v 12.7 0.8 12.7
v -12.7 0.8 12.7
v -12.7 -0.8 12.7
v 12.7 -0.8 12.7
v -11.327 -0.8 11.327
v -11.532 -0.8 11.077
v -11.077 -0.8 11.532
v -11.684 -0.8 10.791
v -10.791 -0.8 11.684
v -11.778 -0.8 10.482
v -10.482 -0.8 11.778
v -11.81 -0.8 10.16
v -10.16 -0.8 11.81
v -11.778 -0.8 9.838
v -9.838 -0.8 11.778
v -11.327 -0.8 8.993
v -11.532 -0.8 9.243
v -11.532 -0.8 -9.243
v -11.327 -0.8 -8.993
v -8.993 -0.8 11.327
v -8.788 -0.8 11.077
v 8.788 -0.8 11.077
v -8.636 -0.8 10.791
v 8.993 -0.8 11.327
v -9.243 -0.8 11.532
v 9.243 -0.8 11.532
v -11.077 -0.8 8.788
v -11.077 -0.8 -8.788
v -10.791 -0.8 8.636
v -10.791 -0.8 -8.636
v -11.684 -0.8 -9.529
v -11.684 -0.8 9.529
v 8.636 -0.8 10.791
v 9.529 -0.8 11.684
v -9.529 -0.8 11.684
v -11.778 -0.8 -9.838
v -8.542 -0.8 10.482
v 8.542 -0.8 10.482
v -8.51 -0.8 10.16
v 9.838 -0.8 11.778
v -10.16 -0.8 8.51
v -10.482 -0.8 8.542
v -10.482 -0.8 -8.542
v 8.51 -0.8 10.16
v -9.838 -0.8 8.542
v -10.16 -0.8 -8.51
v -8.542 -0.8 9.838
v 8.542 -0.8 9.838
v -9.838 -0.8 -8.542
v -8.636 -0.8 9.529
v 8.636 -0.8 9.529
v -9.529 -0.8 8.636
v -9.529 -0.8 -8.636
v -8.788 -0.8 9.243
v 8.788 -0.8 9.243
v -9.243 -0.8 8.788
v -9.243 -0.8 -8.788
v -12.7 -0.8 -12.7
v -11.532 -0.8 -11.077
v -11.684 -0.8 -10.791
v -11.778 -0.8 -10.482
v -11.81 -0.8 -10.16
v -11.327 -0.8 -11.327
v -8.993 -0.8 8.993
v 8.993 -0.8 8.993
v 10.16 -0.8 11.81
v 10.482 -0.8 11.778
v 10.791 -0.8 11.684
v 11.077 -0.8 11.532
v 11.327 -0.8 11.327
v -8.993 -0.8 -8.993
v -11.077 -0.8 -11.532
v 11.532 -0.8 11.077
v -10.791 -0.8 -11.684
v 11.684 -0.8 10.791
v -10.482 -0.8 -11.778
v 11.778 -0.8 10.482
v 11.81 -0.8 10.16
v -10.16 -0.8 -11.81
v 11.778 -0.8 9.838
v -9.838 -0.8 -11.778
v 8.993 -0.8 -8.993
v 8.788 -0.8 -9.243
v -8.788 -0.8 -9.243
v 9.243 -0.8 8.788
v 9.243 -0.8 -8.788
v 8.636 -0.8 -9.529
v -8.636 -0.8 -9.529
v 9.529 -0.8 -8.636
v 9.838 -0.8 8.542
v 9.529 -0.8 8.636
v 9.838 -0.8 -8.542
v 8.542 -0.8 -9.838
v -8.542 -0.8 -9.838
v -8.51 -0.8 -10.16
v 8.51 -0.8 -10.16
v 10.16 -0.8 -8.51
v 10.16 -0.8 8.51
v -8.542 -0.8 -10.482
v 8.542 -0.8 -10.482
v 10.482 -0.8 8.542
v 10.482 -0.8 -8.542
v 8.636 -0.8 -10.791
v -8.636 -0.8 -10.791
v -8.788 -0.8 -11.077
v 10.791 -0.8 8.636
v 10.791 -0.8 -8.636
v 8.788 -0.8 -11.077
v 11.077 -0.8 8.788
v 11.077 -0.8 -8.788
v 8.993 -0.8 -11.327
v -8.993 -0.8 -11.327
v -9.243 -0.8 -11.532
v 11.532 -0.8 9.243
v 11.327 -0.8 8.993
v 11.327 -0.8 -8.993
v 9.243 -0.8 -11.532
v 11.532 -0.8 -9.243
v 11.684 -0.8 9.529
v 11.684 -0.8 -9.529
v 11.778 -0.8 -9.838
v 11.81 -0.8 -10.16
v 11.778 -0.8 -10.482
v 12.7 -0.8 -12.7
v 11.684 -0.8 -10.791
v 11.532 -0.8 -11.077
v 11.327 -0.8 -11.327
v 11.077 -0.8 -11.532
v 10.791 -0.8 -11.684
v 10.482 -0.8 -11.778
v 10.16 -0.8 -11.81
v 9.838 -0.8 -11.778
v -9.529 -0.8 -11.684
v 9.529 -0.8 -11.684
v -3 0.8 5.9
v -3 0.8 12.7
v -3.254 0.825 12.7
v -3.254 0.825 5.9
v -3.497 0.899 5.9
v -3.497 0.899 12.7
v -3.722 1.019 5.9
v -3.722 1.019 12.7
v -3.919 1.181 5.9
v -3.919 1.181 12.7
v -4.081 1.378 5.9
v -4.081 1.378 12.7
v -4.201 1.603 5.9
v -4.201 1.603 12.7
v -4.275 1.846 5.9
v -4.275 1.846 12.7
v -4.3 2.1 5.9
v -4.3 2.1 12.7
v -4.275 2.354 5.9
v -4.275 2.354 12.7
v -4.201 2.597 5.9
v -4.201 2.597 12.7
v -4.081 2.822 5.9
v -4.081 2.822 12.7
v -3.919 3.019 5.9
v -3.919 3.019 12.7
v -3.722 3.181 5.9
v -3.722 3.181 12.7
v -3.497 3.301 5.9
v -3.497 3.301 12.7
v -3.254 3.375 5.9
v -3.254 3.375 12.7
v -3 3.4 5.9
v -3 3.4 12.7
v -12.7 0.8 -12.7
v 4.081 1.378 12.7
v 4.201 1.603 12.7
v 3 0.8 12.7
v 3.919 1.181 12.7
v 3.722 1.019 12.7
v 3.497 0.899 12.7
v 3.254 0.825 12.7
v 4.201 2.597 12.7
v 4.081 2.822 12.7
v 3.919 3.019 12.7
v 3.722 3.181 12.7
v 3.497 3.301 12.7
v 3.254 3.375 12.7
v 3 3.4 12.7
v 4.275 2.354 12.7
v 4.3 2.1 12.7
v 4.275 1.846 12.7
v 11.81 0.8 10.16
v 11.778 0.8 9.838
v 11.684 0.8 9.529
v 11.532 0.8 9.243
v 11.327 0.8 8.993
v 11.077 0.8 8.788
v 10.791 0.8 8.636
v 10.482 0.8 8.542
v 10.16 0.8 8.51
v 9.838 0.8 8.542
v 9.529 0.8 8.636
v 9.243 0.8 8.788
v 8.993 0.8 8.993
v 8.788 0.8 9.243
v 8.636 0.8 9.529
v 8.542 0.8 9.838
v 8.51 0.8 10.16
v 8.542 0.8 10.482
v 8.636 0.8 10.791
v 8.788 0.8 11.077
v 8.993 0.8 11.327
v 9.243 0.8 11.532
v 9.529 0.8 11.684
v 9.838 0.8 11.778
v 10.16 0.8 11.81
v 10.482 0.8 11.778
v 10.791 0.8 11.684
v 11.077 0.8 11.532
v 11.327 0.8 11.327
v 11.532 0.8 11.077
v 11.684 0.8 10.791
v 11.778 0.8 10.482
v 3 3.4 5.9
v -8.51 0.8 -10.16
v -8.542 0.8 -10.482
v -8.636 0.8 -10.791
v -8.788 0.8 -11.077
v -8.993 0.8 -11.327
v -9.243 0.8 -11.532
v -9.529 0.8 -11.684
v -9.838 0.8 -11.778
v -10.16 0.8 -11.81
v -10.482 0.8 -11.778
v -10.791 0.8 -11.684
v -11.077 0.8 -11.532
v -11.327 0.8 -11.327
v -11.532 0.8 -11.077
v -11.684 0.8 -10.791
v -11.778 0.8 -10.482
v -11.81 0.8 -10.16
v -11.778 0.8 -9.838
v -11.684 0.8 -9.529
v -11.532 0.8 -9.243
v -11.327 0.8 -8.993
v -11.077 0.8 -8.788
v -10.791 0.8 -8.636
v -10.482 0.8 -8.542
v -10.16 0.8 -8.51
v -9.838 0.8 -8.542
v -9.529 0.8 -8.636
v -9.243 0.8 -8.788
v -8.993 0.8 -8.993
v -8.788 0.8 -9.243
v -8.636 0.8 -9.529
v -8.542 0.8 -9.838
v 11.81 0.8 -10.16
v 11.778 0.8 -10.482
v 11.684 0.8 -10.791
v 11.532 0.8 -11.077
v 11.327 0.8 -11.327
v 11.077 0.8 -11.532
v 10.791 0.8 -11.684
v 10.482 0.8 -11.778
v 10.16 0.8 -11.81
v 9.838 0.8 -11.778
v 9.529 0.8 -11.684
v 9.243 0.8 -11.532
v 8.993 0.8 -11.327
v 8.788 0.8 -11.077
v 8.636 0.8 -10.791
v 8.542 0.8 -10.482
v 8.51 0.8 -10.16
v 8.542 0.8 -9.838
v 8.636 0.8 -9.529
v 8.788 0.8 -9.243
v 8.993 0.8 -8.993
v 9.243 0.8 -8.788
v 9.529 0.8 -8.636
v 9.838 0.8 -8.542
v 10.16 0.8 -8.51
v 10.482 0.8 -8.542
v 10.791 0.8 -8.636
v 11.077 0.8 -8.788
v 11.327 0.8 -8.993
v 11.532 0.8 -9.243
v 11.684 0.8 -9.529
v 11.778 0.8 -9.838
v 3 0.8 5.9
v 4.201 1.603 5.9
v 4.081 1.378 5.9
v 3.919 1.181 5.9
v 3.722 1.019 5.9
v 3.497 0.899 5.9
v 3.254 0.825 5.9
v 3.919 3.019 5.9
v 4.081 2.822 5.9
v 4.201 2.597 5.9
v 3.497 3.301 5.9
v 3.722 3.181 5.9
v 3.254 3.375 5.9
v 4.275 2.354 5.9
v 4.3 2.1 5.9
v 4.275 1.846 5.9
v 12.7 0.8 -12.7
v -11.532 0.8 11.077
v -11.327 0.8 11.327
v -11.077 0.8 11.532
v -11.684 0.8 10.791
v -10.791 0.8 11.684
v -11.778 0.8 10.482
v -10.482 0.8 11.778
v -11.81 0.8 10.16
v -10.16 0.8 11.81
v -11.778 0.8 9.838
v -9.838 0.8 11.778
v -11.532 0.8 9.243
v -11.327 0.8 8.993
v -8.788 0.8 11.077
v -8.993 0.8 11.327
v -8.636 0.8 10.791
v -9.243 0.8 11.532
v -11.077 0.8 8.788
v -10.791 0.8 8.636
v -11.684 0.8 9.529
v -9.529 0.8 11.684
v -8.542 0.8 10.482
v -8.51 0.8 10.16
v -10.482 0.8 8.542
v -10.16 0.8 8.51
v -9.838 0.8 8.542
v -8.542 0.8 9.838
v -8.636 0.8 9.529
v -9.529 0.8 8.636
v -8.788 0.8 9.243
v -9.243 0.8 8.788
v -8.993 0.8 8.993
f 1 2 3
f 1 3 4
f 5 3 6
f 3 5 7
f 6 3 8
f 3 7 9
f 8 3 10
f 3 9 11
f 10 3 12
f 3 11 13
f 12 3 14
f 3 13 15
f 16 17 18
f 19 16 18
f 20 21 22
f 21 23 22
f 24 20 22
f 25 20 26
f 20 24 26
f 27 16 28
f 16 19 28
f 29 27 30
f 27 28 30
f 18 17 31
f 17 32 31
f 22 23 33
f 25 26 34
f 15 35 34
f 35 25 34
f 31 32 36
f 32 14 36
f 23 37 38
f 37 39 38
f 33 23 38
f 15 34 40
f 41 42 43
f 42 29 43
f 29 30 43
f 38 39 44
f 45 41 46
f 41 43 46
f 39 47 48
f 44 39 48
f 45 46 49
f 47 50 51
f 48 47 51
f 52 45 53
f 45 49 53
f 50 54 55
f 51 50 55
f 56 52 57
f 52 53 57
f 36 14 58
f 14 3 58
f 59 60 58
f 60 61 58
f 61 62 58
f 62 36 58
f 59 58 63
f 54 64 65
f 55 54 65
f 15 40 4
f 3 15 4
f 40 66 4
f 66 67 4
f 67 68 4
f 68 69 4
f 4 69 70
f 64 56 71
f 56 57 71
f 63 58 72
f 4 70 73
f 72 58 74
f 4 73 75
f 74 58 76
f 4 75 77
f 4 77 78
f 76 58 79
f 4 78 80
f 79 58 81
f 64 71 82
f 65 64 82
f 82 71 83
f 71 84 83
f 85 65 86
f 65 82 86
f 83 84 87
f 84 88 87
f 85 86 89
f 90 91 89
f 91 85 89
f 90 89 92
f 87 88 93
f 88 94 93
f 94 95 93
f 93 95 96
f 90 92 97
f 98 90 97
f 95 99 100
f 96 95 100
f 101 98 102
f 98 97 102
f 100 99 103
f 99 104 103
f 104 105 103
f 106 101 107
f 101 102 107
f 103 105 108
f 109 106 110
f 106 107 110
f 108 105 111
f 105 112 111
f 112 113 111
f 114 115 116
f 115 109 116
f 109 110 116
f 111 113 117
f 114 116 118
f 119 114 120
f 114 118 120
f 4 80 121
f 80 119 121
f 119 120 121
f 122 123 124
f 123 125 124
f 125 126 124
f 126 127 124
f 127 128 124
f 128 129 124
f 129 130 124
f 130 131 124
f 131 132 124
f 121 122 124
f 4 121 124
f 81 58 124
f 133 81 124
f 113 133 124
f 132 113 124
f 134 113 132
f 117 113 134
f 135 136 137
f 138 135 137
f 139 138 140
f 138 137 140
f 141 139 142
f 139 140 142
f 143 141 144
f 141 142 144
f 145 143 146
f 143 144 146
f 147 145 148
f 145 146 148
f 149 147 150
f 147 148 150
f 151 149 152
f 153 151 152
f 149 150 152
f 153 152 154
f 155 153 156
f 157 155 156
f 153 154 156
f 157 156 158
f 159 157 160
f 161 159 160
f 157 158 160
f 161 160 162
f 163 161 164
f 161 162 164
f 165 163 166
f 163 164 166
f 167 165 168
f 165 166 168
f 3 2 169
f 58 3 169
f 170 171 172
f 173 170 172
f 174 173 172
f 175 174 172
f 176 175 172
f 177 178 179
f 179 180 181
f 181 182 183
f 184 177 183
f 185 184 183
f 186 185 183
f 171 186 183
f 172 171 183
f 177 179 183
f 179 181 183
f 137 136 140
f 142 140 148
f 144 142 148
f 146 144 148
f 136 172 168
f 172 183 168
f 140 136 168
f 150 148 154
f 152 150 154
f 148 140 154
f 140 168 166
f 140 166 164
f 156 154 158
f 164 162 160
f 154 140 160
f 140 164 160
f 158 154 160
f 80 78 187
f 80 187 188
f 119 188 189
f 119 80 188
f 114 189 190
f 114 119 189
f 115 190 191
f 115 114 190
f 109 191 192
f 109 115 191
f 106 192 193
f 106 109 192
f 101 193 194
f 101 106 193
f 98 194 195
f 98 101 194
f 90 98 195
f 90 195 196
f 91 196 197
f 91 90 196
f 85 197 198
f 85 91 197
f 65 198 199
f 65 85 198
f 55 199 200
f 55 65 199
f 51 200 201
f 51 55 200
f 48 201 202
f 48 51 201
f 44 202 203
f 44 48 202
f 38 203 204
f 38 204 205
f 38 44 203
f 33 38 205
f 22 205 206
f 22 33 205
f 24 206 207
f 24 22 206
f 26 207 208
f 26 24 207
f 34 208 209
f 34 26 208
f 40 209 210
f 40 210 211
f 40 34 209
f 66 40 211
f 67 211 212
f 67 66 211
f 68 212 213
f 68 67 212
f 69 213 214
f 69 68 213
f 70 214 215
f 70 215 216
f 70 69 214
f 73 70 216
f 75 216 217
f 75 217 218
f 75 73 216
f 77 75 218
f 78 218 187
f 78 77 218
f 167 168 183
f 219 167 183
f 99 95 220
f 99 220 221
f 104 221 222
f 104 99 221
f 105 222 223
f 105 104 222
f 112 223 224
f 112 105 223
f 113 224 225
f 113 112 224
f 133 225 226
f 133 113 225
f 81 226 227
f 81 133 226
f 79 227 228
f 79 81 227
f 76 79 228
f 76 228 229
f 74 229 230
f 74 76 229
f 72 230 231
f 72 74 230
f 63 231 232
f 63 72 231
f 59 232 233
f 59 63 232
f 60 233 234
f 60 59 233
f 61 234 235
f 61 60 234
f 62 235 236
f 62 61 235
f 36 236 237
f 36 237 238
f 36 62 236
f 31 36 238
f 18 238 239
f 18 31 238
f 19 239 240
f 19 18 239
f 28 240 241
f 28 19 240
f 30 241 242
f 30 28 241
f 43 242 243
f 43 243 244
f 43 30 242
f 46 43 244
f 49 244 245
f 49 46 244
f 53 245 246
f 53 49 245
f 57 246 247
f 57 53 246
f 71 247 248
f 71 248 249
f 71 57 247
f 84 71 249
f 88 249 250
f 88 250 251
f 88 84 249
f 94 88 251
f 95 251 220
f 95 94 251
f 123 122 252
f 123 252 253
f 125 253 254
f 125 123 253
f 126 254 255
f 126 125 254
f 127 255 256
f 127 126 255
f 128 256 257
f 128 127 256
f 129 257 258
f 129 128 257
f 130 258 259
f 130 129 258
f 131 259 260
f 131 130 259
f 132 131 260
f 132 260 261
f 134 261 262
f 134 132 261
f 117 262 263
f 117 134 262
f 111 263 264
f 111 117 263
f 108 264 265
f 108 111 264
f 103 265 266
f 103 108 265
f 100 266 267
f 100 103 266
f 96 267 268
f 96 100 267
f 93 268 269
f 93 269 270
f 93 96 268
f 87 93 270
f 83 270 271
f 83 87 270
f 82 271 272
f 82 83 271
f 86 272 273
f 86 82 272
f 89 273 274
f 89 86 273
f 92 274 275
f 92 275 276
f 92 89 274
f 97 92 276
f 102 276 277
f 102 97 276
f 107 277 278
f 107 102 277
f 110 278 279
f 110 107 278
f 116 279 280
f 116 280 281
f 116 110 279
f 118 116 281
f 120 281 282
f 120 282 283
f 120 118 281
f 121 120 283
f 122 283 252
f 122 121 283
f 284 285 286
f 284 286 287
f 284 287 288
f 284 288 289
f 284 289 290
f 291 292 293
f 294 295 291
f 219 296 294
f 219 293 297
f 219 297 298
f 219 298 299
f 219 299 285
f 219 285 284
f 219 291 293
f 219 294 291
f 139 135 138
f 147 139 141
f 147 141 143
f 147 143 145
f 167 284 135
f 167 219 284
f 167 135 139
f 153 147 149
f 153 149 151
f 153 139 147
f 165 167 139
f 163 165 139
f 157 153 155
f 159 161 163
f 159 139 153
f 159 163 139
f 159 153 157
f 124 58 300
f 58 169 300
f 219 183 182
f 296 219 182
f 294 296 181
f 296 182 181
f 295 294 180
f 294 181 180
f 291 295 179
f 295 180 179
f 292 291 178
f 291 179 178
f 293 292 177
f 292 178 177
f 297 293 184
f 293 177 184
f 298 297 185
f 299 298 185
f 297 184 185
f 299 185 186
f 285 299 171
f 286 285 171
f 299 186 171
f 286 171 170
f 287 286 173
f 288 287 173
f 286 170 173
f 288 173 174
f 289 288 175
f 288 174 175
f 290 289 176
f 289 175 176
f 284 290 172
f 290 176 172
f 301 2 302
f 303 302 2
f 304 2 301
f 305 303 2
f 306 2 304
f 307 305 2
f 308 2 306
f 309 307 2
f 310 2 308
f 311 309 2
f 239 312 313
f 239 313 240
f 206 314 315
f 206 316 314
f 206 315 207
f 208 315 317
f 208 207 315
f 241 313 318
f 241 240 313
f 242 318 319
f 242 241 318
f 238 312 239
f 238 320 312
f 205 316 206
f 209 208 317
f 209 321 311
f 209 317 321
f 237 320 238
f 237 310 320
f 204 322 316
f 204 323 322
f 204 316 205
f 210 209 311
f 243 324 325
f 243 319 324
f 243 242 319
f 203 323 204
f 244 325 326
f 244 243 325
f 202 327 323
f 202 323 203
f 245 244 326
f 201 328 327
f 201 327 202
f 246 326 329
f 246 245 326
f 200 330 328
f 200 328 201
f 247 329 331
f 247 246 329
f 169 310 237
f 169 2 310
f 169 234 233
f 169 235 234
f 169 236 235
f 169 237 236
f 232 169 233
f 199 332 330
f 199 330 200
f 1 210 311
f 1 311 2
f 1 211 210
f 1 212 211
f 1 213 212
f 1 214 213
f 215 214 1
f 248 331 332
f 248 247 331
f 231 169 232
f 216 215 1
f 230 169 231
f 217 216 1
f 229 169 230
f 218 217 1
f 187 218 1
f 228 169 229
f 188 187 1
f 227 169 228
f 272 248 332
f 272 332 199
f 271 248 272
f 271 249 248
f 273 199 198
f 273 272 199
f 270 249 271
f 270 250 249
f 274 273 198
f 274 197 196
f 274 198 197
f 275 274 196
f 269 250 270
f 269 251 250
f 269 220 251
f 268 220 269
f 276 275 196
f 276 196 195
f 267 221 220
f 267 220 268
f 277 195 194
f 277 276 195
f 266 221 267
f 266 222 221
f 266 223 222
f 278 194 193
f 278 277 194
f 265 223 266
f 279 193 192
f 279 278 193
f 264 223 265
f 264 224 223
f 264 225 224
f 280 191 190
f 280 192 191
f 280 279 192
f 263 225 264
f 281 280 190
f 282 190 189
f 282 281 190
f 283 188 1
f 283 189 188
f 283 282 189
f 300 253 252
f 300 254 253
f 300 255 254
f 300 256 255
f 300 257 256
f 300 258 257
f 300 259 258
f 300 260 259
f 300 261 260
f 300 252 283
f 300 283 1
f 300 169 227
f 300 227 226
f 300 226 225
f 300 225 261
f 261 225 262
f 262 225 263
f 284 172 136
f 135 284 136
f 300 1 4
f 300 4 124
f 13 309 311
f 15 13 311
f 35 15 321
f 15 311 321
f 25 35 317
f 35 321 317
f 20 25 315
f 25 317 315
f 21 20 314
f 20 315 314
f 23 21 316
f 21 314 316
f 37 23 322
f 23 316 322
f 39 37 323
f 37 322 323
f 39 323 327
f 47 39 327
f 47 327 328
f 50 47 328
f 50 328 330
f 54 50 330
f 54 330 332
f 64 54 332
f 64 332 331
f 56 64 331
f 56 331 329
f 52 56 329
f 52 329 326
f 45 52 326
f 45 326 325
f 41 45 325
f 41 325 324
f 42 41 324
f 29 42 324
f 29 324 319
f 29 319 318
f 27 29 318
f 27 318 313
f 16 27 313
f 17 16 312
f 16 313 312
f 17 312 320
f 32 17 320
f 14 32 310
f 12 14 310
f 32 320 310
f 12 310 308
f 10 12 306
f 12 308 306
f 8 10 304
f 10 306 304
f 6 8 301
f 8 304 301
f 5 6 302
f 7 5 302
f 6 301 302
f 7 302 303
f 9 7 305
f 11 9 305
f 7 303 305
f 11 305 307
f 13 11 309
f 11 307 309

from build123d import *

# Parameters (mm, degrees)
SKETCH2_W             = 25.4
SKETCH2_H             = 25.4
BOSS_EXTRUDE1_DEPTH   = 0.8
CUT_EXTRUDE2_REACH    = 20.032
SKETCH5_R             = 1.65
CRVPATTERN1_START     = -0.8
CRVPATTERN1_OUTLINE_R = 1.65
CRVPATTERN1_DEPTH     = 1.6
BOSS_EXTRUDE2_DEPTH   = 6.8


# Read off the part's stored shape, not the designer's step: CrvPattern1
with BuildPart() as part:
    # Sketch2 → Boss-Extrude1 (new, symmetric)
    with BuildSketch(Plane(origin=(0, 0, 0), x_dir=(1, 0, 0), z_dir=(0, 1, 0))):
        Rectangle(SKETCH2_W, SKETCH2_H)
    extrude(amount=BOSS_EXTRUDE1_DEPTH, both=True)

    # Sketch5 → Cut-Extrude2 (cut, up to next)
    with BuildSketch(Plane(origin=(0, 0.8, 0), x_dir=(1, 0, 0), z_dir=(0, 1, 0)), mode=Mode.PRIVATE) as cut_extrude2_sk1:
        with Locations(Location((-10.16, -10.16, 0), (0, 0, 270))):
            Circle(SKETCH5_R)
    cut_extrude2_tool1 = extrude(cut_extrude2_sk1.sketch, amount=-CUT_EXTRUDE2_REACH, mode=Mode.PRIVATE) & part.part
    add(cut_extrude2_tool1.solids().sort_by_distance((-10.16, 0.8, 10.16))[0], mode=Mode.SUBTRACT)

    # CrvPattern1 outline → CrvPattern1 (cut)
    with BuildSketch(Plane(origin=(0, 0, 0), x_dir=(1, 0, 0), z_dir=(0, 1, 0)).offset(CRVPATTERN1_START)):
        with Locations((10.16, 10.16)):
            Circle(CRVPATTERN1_OUTLINE_R)
        with Locations((-10.16, 10.16)):
            Circle(CRVPATTERN1_OUTLINE_R)
        with Locations((10.16, -10.16)):
            Circle(CRVPATTERN1_OUTLINE_R)
    extrude(amount=CRVPATTERN1_DEPTH, mode=Mode.SUBTRACT)


with BuildPart() as body_2:
    # Sketch6 → Boss-Extrude2 (new body)
    with BuildSketch(Plane.XY.offset(12.7)):
        with BuildLine():
            Line((-3, 3.4), (3, 3.4))
            ThreePointArc((3, 3.4), (4.3, 2.1), (3, 0.8))
            Line((3, 0.8), (-3, 0.8))
            ThreePointArc((-3, 0.8), (-4.3, 2.1), (-3, 3.4))
        make_face()
    extrude(amount=-BOSS_EXTRUDE2_DEPTH)


solid = Compound([part.part, body_2.part])
